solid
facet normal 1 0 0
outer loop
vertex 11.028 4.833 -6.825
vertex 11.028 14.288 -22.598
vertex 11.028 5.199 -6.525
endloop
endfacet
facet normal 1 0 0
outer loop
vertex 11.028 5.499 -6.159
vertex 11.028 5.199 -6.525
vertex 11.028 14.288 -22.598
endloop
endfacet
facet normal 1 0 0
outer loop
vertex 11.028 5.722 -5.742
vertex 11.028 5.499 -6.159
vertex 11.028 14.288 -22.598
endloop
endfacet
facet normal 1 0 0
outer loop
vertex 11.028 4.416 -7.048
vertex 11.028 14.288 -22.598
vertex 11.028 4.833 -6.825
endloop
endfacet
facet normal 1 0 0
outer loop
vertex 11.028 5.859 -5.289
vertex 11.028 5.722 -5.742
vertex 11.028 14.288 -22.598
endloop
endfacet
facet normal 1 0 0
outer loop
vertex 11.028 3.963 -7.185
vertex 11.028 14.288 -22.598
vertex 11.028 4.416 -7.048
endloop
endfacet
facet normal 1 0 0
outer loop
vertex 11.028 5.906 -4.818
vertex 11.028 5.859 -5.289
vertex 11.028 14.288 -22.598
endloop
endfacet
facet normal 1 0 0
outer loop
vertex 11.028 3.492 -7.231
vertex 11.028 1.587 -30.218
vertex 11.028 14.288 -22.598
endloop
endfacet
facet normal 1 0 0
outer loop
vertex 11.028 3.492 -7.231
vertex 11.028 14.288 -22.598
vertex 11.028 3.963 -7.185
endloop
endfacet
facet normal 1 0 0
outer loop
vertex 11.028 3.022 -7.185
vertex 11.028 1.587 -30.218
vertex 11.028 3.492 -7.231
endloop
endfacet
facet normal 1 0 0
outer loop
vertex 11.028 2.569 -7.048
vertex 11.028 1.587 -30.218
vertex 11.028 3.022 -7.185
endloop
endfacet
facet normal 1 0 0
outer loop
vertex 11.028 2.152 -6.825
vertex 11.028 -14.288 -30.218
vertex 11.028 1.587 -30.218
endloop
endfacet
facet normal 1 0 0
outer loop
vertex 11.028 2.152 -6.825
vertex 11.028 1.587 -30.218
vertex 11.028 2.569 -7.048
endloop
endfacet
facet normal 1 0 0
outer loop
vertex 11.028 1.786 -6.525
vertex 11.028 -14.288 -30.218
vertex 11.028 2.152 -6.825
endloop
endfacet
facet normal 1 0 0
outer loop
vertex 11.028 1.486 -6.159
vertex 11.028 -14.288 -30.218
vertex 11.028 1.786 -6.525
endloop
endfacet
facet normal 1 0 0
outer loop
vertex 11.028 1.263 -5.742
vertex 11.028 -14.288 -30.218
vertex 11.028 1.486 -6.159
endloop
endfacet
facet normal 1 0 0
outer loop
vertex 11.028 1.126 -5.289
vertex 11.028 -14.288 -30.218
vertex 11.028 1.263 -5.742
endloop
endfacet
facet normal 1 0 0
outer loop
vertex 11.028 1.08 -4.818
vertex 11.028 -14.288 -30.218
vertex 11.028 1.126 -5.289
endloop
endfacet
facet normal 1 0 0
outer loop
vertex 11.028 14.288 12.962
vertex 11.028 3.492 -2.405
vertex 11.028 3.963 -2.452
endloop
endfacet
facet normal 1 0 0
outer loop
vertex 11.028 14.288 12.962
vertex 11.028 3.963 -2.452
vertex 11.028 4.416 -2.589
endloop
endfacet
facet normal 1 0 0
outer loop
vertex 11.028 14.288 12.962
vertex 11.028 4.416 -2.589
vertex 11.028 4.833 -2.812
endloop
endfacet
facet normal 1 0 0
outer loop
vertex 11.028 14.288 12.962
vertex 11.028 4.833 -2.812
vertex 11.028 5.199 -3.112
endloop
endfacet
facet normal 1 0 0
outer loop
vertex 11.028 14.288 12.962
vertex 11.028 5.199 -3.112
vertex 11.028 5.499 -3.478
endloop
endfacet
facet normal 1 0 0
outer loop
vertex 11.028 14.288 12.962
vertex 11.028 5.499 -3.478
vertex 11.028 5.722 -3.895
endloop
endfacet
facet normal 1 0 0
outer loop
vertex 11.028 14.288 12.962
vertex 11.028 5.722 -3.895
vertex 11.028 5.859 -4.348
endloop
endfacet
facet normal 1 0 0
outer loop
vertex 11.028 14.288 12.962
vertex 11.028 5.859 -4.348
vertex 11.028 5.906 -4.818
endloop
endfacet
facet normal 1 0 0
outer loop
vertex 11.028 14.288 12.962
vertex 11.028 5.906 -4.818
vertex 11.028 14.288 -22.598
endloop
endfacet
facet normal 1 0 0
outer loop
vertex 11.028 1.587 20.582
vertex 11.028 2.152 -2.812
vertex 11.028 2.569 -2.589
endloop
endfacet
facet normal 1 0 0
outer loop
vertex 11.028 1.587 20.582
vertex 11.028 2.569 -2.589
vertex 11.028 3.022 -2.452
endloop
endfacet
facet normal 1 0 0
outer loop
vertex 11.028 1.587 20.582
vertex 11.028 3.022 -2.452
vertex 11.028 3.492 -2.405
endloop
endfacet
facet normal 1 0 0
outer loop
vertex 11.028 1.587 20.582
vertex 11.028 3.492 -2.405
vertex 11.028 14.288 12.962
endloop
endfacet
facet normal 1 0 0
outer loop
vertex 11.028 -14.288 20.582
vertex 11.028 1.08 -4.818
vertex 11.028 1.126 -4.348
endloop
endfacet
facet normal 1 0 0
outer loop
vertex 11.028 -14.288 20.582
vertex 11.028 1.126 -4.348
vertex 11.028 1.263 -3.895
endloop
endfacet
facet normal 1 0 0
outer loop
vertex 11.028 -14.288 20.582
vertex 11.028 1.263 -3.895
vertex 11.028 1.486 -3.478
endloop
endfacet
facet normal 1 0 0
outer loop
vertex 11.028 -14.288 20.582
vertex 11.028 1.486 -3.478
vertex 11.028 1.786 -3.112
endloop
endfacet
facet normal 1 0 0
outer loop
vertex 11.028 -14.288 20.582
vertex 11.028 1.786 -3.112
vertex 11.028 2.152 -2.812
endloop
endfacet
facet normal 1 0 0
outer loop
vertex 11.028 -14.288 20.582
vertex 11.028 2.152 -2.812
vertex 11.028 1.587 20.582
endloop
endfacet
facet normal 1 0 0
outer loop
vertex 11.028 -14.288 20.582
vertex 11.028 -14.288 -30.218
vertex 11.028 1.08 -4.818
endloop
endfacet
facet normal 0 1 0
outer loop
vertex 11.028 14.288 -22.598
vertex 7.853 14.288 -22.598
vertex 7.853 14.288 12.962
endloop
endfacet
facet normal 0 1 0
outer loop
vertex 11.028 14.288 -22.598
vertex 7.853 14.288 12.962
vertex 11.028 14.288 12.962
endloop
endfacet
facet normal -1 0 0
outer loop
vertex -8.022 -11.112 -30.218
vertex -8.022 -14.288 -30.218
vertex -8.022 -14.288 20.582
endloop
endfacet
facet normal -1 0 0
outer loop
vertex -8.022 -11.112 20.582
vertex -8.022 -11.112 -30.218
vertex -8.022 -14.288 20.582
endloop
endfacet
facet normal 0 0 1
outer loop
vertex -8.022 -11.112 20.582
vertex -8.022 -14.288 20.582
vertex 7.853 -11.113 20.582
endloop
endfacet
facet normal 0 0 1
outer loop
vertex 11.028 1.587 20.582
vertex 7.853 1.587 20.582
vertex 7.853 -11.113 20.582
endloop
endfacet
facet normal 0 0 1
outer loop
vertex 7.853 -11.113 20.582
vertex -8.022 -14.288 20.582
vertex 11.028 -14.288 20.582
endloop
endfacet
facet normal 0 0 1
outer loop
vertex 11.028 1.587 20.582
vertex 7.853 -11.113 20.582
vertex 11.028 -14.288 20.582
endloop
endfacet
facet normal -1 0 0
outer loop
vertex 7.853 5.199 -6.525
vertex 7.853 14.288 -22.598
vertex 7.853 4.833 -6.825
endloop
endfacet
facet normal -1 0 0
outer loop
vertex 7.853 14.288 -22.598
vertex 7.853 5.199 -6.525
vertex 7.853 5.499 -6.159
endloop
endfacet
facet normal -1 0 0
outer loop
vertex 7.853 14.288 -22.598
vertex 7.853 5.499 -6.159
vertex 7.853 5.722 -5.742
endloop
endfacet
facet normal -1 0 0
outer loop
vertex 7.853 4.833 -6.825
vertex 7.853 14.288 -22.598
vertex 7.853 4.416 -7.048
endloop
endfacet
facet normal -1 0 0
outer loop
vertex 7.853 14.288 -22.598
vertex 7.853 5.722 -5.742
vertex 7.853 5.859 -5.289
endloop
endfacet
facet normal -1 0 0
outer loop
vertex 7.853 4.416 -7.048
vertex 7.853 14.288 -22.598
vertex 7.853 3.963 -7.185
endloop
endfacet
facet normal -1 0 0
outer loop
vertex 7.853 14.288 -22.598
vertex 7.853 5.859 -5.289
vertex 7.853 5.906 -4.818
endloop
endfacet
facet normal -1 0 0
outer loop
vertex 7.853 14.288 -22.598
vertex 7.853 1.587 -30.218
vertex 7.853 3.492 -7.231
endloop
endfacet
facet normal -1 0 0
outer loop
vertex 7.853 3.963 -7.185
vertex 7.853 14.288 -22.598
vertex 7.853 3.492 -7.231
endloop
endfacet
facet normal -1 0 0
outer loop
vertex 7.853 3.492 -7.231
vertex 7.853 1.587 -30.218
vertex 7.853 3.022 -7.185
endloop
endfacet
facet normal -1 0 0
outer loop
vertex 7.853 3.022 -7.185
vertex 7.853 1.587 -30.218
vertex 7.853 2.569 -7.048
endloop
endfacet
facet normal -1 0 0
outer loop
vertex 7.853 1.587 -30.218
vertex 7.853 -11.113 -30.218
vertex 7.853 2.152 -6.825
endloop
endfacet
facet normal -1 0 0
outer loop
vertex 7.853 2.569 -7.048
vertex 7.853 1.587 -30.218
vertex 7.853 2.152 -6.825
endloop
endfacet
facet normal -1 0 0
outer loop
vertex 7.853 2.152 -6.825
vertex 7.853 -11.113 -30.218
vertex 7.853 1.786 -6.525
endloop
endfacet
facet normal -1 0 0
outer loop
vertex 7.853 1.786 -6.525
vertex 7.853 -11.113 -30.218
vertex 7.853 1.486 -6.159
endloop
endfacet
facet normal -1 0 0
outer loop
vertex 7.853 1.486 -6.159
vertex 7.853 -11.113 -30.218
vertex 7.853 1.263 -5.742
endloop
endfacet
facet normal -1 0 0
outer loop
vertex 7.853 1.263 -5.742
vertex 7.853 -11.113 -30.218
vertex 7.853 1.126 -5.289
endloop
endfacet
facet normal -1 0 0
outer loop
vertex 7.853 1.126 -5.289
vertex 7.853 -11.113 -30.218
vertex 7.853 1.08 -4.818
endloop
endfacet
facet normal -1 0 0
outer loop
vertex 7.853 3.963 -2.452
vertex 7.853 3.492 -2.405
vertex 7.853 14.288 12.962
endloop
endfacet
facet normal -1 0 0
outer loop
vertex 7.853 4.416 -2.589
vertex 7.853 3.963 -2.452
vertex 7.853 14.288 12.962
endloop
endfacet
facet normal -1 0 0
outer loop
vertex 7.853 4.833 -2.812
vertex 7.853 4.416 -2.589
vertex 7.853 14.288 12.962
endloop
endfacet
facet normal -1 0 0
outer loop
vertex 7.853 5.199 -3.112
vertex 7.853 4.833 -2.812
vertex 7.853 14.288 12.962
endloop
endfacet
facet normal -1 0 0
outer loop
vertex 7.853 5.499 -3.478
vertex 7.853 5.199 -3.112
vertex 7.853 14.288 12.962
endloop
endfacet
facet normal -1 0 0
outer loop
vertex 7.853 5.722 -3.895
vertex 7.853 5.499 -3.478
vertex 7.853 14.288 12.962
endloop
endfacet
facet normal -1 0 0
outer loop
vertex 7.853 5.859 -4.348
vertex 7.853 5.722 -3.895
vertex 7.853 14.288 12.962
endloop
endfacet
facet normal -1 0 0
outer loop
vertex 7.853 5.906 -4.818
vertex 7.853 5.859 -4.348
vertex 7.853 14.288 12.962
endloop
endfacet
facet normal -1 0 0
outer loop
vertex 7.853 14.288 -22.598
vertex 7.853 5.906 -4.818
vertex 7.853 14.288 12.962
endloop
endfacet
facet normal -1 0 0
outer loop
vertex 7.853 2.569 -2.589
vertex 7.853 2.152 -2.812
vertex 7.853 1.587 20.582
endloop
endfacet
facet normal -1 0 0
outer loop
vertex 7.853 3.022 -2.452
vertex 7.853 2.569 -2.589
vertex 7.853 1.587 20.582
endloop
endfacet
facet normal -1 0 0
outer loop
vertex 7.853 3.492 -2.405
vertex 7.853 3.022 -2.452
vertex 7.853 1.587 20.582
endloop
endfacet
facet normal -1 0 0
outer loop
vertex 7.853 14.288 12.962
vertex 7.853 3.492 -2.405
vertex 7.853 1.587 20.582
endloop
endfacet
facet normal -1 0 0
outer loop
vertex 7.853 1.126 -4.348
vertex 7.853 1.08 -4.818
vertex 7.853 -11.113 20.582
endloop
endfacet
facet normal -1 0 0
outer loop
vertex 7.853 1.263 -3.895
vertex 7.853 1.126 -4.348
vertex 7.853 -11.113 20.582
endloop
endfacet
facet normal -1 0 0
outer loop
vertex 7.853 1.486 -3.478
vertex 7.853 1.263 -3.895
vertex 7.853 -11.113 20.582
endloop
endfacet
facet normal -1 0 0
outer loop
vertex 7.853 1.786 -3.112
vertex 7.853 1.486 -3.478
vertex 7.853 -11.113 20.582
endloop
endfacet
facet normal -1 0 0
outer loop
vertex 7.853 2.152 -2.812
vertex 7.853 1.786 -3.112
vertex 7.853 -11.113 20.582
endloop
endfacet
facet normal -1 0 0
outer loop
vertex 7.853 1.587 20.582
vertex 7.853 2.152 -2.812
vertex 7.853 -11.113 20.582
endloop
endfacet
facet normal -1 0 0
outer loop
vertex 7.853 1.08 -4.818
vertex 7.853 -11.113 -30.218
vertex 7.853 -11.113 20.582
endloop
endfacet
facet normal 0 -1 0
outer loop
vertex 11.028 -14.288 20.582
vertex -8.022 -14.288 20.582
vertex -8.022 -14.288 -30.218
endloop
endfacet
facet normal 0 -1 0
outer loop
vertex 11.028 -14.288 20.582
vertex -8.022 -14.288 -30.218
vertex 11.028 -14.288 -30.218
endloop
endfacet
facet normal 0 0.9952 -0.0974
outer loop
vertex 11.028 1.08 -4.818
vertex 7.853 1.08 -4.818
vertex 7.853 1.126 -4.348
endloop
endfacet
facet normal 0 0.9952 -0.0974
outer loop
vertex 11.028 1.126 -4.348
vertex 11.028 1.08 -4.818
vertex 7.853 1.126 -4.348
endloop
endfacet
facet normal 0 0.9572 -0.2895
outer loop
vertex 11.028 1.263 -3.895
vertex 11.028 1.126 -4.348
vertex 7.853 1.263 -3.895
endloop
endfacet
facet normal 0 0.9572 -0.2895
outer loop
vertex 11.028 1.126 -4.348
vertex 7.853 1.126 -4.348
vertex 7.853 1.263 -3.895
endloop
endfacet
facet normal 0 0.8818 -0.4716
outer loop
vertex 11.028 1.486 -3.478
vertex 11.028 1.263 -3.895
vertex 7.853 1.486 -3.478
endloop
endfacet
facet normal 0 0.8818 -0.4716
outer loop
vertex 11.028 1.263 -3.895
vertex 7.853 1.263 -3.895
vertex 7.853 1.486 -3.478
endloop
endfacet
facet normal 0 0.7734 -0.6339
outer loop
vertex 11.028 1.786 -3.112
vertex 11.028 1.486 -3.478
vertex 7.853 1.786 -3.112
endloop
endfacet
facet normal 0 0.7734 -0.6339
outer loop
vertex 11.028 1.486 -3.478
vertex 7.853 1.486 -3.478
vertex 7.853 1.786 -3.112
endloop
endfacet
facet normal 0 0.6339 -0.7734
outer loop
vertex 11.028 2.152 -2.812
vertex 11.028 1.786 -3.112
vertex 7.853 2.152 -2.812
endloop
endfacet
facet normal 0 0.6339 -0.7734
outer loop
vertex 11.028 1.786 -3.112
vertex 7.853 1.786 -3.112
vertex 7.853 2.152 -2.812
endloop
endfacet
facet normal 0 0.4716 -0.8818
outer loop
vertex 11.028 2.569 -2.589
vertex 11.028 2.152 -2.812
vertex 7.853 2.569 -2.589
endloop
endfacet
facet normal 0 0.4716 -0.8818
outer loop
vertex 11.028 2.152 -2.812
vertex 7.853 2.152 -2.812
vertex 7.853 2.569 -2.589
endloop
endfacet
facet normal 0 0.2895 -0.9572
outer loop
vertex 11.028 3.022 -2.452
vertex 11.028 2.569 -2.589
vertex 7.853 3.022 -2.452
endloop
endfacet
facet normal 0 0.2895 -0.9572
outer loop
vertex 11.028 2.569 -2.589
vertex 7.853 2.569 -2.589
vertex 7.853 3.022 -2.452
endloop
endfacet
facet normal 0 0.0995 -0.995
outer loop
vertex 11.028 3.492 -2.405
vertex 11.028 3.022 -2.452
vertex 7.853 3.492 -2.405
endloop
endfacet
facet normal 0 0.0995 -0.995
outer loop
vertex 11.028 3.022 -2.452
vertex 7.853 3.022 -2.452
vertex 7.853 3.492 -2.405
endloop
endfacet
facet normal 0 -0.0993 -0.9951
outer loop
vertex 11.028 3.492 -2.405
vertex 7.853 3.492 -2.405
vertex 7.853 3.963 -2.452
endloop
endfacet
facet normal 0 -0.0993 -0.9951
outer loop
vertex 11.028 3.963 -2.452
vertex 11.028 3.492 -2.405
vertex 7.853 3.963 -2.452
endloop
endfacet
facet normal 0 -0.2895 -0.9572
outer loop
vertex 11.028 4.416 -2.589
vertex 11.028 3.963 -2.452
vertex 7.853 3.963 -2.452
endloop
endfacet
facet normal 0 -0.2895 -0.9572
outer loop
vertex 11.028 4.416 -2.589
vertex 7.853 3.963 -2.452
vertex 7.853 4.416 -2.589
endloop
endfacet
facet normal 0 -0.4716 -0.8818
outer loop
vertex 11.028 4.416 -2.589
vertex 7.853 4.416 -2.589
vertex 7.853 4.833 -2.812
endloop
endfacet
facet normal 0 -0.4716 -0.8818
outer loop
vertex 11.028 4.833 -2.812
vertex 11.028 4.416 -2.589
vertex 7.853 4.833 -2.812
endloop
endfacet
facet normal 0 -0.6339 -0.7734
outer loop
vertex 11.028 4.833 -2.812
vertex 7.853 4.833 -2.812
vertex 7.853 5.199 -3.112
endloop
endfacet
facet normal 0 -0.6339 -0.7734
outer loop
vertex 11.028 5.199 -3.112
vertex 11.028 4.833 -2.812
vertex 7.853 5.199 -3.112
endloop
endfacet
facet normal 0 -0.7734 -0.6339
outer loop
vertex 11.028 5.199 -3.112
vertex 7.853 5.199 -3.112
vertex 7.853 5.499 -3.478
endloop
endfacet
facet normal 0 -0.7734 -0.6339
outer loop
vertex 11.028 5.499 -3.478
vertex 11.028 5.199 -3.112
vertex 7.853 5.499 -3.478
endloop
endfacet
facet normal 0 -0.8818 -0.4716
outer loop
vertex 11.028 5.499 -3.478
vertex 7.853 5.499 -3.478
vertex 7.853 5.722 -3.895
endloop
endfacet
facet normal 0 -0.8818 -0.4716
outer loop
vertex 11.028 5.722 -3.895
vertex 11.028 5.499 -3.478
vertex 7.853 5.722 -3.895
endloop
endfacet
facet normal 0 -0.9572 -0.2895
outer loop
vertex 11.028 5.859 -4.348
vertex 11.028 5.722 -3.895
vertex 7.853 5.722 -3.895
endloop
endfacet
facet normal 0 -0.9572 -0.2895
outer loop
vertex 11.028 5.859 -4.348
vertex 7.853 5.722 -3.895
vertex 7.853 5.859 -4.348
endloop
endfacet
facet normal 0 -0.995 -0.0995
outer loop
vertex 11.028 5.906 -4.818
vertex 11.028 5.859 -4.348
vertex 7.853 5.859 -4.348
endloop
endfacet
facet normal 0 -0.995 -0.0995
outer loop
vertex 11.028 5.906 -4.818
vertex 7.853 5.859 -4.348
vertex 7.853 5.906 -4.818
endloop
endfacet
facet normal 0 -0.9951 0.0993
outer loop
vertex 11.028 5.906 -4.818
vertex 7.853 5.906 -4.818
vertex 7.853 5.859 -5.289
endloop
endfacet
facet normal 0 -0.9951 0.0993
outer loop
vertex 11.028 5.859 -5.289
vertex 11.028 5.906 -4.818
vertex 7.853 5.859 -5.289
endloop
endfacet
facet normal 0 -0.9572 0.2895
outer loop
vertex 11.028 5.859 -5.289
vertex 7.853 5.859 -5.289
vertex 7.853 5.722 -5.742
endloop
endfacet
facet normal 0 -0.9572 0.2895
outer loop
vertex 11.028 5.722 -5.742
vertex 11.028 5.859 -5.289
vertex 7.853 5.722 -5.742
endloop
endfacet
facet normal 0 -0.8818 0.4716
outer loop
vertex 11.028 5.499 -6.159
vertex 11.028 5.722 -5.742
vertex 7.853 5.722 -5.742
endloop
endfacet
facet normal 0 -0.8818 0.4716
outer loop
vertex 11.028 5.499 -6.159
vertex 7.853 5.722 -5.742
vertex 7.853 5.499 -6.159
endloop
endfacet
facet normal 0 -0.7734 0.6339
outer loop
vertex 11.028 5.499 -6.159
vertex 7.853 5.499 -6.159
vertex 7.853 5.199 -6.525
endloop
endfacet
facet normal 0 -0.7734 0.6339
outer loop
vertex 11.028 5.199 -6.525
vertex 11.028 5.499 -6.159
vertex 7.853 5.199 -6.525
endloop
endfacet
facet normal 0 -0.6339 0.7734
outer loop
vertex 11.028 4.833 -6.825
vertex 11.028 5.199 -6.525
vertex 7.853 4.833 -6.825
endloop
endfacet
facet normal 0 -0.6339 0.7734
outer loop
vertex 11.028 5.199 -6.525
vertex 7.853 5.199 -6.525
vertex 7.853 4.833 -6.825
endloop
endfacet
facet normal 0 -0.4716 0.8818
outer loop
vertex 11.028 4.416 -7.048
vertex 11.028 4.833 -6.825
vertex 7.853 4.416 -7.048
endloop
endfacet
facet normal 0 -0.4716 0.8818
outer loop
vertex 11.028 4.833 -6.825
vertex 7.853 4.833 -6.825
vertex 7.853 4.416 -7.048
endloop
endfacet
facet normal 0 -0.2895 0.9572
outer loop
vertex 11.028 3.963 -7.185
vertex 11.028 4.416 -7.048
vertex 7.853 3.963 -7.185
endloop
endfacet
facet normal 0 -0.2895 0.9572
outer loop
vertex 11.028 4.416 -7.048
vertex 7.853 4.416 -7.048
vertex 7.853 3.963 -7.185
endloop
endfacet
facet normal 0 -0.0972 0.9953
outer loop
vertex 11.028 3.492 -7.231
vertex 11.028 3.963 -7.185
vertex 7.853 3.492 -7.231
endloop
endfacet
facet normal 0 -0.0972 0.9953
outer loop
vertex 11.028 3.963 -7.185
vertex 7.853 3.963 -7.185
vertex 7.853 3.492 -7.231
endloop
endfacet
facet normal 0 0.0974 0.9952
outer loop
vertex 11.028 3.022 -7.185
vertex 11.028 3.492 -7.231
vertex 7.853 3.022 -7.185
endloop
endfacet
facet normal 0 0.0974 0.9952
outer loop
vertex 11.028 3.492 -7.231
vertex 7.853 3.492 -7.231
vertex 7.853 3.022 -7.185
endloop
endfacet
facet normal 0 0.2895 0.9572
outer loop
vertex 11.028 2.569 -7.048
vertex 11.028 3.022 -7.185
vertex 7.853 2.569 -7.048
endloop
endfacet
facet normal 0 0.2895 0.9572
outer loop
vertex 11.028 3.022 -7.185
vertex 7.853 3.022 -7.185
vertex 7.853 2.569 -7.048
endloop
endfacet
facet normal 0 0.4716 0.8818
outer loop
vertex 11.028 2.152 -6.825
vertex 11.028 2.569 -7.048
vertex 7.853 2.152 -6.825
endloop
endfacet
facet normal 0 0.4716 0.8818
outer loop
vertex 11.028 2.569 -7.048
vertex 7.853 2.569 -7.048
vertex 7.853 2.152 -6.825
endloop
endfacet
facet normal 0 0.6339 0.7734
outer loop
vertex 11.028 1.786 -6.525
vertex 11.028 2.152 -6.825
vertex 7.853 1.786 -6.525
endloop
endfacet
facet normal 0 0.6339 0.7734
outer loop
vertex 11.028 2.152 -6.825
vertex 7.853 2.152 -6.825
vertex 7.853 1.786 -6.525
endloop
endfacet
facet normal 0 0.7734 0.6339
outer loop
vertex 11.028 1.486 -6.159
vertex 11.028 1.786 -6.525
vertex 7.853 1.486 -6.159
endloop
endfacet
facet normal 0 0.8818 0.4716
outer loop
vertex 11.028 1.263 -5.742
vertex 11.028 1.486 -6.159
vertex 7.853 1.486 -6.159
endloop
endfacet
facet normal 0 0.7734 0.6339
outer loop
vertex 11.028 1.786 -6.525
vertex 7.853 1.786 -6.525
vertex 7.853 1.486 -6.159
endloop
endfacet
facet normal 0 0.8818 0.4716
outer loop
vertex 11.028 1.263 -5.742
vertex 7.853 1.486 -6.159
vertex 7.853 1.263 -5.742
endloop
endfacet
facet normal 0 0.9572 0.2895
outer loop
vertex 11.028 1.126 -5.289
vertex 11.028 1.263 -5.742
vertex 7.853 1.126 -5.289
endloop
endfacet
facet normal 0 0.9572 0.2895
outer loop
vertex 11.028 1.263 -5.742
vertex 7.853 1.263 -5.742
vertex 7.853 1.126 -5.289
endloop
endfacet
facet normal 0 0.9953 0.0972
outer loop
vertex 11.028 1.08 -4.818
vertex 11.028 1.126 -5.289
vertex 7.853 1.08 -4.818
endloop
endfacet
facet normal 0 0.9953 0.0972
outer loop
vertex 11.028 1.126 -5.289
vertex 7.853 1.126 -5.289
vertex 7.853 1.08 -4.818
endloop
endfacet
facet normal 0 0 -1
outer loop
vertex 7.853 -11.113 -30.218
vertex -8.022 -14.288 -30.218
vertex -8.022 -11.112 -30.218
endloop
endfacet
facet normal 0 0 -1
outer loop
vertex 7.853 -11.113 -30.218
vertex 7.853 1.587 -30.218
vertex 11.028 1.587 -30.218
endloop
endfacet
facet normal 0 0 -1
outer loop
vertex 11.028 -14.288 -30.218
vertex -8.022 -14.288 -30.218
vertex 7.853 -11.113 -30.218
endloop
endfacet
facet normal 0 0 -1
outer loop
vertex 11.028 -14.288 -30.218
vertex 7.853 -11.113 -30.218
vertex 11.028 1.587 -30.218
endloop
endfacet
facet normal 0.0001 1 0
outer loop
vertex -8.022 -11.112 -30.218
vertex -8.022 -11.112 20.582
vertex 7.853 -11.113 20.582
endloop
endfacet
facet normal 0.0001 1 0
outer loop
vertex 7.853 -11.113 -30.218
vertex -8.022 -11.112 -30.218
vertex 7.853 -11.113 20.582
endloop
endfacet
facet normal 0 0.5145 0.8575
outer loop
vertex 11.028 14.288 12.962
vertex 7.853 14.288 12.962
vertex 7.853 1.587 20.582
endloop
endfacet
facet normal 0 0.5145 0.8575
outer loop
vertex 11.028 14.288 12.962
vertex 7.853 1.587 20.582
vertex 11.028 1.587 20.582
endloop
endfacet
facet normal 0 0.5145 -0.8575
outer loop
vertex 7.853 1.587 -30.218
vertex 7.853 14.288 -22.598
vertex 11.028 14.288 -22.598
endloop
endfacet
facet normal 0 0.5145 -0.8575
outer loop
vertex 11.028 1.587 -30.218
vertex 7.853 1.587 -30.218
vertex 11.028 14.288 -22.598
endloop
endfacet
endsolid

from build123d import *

# Parameters (mm, degrees)
F0_W     = 19.05
F0_H     = 50.8
F1_DEPTH = 14.2875
F2_T     = -3.175
F4_D     = 4.826
F5_SIZE2 = 7.62
F5_SIZE  = 12.7


with BuildPart() as f1:
    # F0 (on Front) → F1 (new body, symmetric)
    with BuildSketch(Plane.XZ):
        with Locations((1.503078, -4.818475)):
            Rectangle(F0_W, F0_H)
    extrude(amount=F1_DEPTH, both=True)

    # F2
    f2_openings = [f1.faces().sort_by_distance(p)[0] for p in [
        (-8.021922, 0, -4.818475),
        (1.503078, 0, -30.218475),
        (1.503078, 14.2875, -4.818475),
        (1.503078, 0, 20.581525),
    ]]
    offset(amount=F2_T, openings=f2_openings)

    # F4 (through all)
    with Locations(Plane.YZ.offset(11.028078)):
        with Locations((3.4925, -4.818475)):
            Hole(F4_D / 2)

    # F5
    f5_edges = [f1.edges().sort_by_distance(p)[0] for p in [
        (9.440578, 14.2875, -30.218475),
        (9.440578, 14.2875, 20.581525),
    ]]
    chamfer(f5_edges, length=F5_SIZE, length2=F5_SIZE2)


solid = f1.part
